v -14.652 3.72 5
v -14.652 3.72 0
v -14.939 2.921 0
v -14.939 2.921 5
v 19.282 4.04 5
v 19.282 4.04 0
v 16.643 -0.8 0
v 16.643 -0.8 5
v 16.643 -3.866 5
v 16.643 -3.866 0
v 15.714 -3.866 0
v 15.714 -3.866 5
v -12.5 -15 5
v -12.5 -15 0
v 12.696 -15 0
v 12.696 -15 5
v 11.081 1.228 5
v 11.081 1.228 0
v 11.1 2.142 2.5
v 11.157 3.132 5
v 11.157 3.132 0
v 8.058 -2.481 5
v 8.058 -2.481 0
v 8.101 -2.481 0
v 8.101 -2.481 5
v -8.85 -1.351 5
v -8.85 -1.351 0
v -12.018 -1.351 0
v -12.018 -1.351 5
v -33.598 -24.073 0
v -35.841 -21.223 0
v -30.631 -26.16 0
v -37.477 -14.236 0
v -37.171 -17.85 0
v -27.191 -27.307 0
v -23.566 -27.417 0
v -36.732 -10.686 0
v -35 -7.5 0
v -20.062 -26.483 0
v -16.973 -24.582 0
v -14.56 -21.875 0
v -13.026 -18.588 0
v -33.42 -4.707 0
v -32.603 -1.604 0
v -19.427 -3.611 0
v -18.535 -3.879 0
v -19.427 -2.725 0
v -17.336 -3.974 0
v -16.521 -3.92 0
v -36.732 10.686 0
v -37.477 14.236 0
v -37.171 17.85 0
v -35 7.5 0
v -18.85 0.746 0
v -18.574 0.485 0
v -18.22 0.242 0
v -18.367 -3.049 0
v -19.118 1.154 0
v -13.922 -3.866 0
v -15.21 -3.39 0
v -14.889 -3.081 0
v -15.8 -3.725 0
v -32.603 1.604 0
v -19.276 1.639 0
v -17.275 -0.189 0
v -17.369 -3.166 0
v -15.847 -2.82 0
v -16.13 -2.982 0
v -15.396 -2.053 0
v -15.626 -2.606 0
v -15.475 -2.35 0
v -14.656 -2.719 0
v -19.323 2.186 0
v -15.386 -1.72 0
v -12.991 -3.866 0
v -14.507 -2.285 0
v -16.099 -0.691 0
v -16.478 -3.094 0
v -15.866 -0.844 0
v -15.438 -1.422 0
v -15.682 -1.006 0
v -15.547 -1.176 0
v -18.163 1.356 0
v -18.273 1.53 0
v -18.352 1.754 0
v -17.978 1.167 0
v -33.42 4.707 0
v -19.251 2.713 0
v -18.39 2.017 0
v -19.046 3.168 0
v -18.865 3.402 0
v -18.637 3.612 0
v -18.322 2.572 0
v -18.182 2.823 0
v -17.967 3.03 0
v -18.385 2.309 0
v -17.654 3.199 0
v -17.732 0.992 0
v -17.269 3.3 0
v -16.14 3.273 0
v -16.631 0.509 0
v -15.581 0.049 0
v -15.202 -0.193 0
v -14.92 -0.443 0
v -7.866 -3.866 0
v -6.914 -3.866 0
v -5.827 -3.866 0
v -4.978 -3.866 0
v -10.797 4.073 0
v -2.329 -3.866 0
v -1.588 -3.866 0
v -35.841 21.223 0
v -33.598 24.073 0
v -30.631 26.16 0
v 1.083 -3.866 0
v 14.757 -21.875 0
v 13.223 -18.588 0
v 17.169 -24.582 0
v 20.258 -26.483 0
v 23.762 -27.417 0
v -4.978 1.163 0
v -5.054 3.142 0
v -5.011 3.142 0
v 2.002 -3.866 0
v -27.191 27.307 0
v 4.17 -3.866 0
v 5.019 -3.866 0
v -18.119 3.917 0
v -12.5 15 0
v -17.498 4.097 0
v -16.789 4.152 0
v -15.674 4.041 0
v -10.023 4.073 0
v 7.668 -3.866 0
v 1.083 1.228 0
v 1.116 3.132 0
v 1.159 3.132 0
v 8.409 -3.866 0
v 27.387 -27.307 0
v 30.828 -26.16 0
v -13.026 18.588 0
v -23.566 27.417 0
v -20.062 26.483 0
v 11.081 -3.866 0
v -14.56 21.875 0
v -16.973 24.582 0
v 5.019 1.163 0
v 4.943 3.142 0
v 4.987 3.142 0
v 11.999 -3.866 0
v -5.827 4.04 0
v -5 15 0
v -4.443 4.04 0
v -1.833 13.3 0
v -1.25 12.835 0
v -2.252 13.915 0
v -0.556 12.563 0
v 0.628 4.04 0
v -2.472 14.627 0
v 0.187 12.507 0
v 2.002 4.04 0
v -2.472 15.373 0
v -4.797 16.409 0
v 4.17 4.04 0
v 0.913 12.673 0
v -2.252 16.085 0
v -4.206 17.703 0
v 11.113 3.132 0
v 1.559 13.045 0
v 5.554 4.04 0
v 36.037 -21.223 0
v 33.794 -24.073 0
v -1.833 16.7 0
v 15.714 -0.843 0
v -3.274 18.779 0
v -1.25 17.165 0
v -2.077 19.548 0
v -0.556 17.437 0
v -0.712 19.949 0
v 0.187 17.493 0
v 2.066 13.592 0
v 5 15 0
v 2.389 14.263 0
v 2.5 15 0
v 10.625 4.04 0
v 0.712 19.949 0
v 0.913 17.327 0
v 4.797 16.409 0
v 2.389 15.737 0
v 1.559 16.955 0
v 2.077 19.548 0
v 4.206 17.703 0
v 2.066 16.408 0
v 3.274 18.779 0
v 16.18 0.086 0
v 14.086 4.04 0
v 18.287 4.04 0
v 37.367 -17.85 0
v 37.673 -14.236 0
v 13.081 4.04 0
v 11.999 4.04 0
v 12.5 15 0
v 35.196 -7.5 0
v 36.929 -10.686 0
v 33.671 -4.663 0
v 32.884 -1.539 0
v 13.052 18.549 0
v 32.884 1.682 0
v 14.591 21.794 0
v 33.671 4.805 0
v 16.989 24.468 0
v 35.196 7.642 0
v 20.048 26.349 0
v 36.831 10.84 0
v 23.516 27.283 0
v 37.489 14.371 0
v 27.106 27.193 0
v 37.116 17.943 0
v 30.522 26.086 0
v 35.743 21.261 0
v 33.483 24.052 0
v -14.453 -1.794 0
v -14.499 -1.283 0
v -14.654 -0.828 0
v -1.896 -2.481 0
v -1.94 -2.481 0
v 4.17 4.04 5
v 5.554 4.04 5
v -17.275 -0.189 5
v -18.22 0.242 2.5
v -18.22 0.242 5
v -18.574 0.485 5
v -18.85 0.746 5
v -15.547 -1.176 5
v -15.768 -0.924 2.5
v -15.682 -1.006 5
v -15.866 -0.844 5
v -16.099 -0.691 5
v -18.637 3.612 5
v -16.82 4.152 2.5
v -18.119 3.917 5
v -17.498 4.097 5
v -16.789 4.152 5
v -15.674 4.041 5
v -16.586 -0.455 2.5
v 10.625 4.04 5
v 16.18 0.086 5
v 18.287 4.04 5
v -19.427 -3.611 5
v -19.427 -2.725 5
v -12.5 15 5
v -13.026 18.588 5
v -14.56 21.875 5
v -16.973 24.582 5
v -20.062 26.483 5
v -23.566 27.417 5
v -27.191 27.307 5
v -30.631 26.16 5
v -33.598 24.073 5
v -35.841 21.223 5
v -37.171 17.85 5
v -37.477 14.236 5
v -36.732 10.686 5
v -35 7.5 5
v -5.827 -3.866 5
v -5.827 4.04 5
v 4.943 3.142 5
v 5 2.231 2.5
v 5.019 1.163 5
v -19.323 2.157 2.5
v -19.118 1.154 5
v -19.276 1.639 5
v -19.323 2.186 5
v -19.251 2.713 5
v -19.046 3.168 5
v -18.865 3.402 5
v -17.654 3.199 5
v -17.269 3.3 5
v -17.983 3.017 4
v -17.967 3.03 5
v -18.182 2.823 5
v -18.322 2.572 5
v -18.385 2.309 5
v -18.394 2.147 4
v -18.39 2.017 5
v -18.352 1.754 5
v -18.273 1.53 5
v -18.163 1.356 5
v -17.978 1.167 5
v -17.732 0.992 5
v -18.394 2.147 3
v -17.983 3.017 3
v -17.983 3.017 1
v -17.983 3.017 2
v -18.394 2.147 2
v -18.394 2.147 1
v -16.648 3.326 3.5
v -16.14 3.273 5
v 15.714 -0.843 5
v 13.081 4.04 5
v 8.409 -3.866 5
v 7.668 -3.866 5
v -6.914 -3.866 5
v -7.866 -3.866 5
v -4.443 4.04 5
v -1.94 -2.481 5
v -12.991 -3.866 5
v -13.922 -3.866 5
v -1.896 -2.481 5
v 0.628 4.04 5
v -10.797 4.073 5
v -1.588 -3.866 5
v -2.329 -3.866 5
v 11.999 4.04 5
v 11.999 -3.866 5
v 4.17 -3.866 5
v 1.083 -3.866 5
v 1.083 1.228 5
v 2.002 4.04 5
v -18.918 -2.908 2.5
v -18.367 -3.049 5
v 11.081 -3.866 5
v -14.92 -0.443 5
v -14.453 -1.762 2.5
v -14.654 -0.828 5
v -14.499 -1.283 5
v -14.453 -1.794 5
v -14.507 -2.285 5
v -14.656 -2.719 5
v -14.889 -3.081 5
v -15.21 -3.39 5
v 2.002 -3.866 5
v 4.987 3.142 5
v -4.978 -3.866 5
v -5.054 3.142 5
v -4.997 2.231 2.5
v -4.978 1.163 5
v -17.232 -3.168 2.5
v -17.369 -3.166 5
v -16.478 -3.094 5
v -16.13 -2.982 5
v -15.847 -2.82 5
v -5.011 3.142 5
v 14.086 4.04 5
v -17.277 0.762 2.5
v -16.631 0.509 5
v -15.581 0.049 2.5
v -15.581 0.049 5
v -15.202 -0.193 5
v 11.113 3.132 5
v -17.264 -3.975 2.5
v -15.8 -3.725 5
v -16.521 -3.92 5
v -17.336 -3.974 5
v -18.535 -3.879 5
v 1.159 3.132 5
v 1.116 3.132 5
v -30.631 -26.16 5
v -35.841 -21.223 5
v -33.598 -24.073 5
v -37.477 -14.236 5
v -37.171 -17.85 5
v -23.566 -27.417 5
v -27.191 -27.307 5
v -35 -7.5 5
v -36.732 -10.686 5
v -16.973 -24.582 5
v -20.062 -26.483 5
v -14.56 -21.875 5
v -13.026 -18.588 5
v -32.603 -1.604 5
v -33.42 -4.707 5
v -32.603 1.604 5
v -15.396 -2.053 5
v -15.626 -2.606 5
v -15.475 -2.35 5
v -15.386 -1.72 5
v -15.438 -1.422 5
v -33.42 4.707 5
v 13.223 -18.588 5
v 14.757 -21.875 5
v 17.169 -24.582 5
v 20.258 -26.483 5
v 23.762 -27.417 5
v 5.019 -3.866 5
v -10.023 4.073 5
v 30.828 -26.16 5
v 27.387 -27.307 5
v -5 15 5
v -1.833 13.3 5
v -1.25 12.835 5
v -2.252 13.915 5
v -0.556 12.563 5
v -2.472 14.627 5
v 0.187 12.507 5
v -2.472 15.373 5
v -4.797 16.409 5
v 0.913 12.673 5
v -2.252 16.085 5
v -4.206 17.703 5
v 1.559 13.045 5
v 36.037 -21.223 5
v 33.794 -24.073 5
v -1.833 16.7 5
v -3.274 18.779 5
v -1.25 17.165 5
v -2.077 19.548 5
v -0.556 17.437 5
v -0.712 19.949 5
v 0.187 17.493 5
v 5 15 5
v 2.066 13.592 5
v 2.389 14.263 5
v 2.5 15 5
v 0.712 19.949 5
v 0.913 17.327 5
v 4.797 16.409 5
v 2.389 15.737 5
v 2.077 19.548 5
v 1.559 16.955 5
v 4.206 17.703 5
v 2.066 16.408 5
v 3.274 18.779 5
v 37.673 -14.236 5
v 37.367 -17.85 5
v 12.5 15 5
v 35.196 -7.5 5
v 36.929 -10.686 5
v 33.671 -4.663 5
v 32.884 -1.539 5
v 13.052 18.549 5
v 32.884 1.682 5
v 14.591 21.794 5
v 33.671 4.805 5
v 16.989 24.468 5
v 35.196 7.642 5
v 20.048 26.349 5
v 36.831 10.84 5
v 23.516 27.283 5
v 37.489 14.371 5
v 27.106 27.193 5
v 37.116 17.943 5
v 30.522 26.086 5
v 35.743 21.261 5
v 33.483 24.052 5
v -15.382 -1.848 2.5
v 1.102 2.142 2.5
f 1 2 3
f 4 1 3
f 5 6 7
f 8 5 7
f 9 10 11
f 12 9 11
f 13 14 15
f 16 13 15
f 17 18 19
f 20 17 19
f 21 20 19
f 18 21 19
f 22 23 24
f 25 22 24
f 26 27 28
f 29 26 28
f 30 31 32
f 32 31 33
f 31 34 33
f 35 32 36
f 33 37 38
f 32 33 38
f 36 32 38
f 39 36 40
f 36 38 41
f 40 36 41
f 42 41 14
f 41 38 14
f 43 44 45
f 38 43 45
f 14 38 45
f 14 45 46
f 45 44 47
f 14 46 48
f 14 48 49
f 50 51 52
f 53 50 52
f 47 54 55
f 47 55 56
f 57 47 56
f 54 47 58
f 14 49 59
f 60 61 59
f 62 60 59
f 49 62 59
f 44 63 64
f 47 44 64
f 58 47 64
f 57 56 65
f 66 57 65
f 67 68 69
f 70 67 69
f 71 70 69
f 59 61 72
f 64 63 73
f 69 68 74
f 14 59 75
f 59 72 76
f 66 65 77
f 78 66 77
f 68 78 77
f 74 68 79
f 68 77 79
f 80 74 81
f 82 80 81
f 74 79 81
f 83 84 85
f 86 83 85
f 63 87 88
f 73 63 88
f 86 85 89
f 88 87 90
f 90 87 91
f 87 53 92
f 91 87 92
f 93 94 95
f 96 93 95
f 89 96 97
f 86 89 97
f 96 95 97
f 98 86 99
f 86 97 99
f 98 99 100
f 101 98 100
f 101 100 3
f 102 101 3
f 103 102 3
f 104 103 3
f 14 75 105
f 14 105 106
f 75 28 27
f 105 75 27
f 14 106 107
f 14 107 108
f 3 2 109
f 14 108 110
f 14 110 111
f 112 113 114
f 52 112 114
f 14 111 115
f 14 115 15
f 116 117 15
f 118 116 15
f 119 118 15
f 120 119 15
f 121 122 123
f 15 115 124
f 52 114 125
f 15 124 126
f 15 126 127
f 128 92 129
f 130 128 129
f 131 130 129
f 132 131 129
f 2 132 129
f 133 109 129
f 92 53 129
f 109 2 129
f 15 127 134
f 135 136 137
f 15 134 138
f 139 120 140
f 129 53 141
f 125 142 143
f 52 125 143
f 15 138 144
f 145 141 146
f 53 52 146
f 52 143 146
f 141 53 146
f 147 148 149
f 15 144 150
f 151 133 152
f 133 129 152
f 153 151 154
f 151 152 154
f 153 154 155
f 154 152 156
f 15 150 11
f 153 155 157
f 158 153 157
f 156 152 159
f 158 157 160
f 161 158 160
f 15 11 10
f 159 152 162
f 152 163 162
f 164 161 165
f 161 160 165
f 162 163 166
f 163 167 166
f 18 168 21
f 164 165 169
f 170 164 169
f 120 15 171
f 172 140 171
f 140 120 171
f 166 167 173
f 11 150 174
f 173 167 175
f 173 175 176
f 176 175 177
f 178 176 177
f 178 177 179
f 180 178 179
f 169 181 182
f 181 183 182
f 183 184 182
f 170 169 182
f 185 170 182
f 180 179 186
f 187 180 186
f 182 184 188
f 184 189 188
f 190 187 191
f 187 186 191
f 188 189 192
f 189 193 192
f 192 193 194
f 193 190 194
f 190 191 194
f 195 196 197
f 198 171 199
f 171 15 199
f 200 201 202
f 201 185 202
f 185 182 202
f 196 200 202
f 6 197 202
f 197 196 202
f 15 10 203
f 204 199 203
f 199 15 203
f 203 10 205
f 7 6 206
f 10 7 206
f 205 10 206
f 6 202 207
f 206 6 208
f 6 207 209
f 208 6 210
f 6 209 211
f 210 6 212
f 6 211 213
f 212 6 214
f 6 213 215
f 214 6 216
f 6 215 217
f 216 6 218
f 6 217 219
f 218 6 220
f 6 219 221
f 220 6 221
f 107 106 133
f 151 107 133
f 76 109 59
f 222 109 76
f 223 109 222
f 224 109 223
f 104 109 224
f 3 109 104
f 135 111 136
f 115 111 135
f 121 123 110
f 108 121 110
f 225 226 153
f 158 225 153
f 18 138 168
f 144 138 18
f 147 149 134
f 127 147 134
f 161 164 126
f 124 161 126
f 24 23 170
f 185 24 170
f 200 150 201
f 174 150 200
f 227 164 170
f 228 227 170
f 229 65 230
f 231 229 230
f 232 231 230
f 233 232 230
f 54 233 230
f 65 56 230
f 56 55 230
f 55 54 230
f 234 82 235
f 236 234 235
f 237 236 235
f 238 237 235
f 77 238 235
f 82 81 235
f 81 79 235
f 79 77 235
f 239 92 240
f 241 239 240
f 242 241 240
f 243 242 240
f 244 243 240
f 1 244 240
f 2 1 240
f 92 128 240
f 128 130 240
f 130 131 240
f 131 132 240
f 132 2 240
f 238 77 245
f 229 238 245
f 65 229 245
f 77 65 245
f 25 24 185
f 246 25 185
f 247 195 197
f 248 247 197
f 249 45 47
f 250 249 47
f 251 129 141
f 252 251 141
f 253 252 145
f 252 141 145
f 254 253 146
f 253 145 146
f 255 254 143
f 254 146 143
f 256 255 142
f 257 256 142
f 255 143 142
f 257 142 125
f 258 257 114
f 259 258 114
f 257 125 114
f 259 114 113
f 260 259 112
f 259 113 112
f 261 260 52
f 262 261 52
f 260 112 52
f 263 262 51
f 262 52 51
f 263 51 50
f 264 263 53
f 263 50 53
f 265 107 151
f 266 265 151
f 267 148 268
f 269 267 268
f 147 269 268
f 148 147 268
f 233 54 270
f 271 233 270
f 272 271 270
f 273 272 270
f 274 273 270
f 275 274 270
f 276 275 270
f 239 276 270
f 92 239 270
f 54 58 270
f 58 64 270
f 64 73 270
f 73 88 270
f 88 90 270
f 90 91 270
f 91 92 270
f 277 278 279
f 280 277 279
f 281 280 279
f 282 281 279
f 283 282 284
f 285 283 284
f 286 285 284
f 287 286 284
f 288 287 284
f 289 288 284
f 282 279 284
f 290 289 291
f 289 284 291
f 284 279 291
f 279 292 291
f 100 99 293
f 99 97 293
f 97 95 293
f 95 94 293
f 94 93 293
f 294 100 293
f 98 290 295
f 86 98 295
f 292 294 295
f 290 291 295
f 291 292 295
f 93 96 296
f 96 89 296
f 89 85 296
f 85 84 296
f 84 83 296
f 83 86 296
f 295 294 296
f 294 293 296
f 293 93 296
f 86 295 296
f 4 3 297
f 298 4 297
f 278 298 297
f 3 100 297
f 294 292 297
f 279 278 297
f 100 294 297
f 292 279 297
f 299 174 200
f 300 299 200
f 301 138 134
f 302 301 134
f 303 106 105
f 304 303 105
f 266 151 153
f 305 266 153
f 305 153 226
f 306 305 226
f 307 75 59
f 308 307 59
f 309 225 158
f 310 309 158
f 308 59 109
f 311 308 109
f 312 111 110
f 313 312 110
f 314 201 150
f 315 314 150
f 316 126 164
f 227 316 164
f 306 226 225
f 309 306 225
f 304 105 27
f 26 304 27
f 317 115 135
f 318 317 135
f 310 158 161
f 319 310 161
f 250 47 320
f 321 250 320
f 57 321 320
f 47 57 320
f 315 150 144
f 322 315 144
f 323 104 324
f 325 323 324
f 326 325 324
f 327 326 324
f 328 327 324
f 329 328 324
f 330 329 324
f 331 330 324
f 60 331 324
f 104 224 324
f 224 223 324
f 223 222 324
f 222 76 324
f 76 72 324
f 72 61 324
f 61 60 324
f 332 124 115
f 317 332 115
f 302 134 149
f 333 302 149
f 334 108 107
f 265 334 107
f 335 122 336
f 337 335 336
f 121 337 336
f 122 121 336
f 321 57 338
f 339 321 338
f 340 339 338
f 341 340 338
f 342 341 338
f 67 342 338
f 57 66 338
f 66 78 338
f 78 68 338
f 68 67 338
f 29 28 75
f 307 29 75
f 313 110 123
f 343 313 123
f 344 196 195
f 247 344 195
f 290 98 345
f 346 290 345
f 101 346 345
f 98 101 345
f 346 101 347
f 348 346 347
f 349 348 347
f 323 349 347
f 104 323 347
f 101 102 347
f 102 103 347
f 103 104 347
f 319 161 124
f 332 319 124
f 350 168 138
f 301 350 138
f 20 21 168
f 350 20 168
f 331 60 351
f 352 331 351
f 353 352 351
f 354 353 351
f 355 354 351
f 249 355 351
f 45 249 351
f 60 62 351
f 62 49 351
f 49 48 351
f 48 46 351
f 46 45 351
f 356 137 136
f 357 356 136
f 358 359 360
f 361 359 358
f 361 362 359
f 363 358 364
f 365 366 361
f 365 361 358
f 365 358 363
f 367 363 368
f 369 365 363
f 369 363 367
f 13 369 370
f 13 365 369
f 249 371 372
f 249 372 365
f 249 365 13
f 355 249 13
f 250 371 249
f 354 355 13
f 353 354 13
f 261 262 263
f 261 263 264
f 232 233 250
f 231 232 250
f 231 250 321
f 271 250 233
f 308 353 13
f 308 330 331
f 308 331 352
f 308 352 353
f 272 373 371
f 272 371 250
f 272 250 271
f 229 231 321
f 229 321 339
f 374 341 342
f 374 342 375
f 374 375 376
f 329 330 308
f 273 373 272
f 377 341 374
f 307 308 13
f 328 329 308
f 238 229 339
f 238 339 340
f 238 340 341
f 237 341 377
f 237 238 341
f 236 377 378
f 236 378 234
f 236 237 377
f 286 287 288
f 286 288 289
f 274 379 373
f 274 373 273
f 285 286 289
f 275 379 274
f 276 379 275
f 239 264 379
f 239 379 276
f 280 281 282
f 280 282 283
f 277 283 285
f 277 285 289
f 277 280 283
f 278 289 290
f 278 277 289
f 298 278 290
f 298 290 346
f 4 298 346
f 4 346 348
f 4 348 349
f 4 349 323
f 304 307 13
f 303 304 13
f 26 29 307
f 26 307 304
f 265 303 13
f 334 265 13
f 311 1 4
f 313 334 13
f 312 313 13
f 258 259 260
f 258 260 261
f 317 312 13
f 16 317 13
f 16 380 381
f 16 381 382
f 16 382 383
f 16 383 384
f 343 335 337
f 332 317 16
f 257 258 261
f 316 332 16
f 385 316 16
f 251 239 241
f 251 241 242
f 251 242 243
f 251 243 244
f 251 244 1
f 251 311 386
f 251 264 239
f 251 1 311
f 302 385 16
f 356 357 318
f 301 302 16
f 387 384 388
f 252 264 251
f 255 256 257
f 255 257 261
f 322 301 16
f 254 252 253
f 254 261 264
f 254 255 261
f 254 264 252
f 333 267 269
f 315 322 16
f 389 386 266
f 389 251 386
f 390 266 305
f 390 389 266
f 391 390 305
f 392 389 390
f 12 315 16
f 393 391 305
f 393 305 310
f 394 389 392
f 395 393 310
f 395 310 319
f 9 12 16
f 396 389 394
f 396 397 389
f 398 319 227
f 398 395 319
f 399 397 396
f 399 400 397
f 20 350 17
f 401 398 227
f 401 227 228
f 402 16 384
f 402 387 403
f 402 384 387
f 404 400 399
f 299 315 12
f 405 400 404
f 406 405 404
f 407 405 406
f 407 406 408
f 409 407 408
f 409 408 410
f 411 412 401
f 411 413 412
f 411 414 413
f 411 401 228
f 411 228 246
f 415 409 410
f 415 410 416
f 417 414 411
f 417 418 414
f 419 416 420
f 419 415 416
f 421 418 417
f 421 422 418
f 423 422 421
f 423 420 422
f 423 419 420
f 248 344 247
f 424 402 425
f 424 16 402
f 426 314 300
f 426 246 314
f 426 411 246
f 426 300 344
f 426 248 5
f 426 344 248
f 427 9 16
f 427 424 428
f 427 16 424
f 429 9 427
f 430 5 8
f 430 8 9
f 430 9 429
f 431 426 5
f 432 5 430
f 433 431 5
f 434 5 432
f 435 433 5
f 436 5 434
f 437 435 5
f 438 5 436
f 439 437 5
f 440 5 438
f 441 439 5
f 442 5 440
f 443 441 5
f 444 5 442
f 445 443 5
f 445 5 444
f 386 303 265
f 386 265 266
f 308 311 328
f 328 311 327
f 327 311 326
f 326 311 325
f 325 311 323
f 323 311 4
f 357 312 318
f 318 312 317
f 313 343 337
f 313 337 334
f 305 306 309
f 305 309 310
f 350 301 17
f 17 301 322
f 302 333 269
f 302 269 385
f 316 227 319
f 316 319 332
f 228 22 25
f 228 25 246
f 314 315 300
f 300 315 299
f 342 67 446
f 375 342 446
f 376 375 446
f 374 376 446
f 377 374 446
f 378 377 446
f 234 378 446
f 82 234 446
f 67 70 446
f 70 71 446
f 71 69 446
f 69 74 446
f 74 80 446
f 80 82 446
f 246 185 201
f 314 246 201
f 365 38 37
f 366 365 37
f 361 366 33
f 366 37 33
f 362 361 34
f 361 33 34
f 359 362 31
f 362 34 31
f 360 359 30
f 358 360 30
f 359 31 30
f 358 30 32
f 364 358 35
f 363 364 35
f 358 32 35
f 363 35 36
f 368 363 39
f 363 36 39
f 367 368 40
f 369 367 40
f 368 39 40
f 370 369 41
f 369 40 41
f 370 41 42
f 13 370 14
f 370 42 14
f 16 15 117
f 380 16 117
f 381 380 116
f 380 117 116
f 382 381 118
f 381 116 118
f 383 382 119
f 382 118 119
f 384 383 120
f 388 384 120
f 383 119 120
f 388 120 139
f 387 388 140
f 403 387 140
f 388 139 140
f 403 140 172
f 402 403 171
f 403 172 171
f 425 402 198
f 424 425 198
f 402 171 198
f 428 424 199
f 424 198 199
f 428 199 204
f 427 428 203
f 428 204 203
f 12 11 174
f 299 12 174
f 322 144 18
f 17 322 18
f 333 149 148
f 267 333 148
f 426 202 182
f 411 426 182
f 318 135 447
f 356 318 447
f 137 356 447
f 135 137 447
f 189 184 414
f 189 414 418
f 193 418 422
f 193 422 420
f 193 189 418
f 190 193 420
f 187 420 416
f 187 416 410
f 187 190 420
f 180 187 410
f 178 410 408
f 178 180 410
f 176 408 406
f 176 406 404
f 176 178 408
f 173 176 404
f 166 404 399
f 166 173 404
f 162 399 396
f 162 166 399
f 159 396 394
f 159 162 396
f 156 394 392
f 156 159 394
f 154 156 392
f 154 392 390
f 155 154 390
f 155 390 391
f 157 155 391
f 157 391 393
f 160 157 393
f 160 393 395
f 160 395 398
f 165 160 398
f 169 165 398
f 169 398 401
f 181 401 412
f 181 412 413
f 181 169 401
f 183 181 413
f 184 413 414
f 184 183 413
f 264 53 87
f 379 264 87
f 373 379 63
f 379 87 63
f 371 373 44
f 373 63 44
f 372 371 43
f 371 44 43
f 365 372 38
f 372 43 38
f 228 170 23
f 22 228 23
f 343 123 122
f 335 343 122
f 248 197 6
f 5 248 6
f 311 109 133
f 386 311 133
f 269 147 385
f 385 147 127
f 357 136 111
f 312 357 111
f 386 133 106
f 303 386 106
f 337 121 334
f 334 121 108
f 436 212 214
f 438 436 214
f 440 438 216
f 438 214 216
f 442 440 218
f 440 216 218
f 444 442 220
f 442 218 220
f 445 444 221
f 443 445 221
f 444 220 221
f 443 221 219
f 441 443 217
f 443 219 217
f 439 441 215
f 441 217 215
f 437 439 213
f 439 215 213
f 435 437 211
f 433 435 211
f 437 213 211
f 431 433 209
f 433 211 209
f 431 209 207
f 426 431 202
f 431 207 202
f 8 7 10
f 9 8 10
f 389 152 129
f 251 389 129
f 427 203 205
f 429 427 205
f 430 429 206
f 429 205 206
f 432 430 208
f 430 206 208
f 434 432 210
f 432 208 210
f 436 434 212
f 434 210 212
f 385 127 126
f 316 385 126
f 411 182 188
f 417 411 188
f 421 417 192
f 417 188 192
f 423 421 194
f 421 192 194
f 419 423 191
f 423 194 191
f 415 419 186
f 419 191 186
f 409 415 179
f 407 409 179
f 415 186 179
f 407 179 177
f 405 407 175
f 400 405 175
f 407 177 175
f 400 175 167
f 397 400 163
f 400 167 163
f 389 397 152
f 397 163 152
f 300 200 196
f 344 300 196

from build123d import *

# Parameters (mm, degrees)
F0_R     = 2.5
F1_DEPTH = 5


with BuildPart() as f1:
    # F0 (on Top) → F1 (new body)
    with BuildSketch(Plane.XY):
        with BuildLine():
            Line((-5, 15), (-12.5, 15))
            ThreePointArc((-12.5, 15), (-28.9528470752, 26.8585412256), (-35, 7.5))
            ThreePointArc((-35, 7.5), (-32.5, 0), (-35, -7.5))
            ThreePointArc((-35, -7.5), (-28.9528470752, -26.8585412256), (-12.5, -15))
            Line((-12.5, -15), (12.6964542654, -15))
            ThreePointArc((12.6964542654, -15), (29.1493013406, -26.8585412256), (35.1964542654, -7.5))
            ThreePointArc((35.1964542654, -7.5), (32.784838444, 0.0710641767), (35.1964542654, 7.6421283534))
            ThreePointArc((35.1964542654, 7.6421283534), (28.8541630659, 26.7626213853), (12.5, 15))
            Line((12.5, 15), (5, 15))
            ThreePointArc((5, 15), (0, 20), (-5, 15))
        make_face()
        with BuildLine():
            add(Edge.make_bspline(
                [(-14.9199757765, -0.4431015054), (-14.4528073363, -0.9517960291), (-14.4528073363, -1.7615546588)],
                knots=[0, 0, 0, 1, 1, 1], degree=2))
            add(Edge.make_bspline(
                [(-14.4528073363, -1.7615546588), (-14.4528073363, -2.8048975085), (-15.2097932347, -3.3897231855)],
                knots=[0, 0, 0, 1, 1, 1], degree=2))
            add(Edge.make_bspline(
                [(-15.2097932347, -3.3897231855), (-15.9667791331, -3.9745488624), (-17.2644692447, -3.9745488624)],
                knots=[0, 0, 0, 1, 1, 1], degree=2))
            add(Edge.make_bspline(
                [(-17.2644692447, -3.9745488624), (-18.6694350722, -3.9745488624), (-19.4272860974, -3.6111956312)],
                knots=[0, 0, 0, 1, 1, 1], degree=2))
            Line((-19.4272860974, -3.6111956312), (-19.4272860974, -2.7253058483))
            add(Edge.make_bspline(
                [(-19.4272860974, -2.7253058483), (-18.9393546155, -2.9294757592), (-18.3666407129, -3.0488632495)],
                knots=[0, 0, 0, 1, 1, 1], degree=2))
            add(Edge.make_bspline(
                [(-18.3666407129, -3.0488632495), (-17.7939268103, -3.1682507397), (-17.2315944286, -3.1682507397)],
                knots=[0, 0, 0, 1, 1, 1], degree=2))
            add(Edge.make_bspline(
                [(-17.2315944286, -3.1682507397), (-16.3128298296, -3.1682507397), (-15.8473916429, -2.8196046631)],
                knots=[0, 0, 0, 1, 1, 1], degree=2))
            add(Edge.make_bspline(
                [(-15.8473916429, -2.8196046631), (-15.3819534562, -2.4709585864), (-15.3819534562, -1.8480673329)],
                knots=[0, 0, 0, 1, 1, 1], degree=2))
            add(Edge.make_bspline(
                [(-15.3819534562, -1.8480673329), (-15.3819534562, -1.4379972576), (-15.5471926637, -1.1758638551)],
                knots=[0, 0, 0, 1, 1, 1], degree=2))
            add(Edge.make_bspline(
                [(-15.5471926637, -1.1758638551), (-15.7124318713, -0.9137304525), (-16.0991435245, -0.6913928801)],
                knots=[0, 0, 0, 1, 1, 1], degree=2))
            add(Edge.make_bspline(
                [(-16.0991435245, -0.6913928801), (-16.4858551778, -0.4690553076), (-17.2748507656, -0.1887542435)],
                knots=[0, 0, 0, 1, 1, 1], degree=2))
            add(Edge.make_bspline(
                [(-17.2748507656, -0.1887542435), (-18.3770222338, 0.2057435504), (-18.8502465611, 0.7464477636)],
                knots=[0, 0, 0, 1, 1, 1], degree=2))
            add(Edge.make_bspline(
                [(-18.8502465611, 0.7464477636), (-19.3234708885, 1.2871519767), (-19.3234708885, 2.1574694783)],
                knots=[0, 0, 0, 1, 1, 1], degree=2))
            add(Edge.make_bspline(
                [(-19.3234708885, 2.1574694783), (-19.3234708885, 3.0710433168), (-18.6374253828, 3.61174753)],
                knots=[0, 0, 0, 1, 1, 1], degree=2))
            add(Edge.make_bspline(
                [(-18.6374253828, 3.61174753), (-17.9513798772, 4.1524517432), (-16.8197940998, 4.1524517432)],
                knots=[0, 0, 0, 1, 1, 1], degree=2))
            add(Edge.make_bspline(
                [(-16.8197940998, 4.1524517432), (-15.6414914785, 4.1524517432), (-14.6517864867, 3.7198883726)],
                knots=[0, 0, 0, 1, 1, 1], degree=2))
            Line((-14.6517864867, 3.7198883726), (-14.9390085648, 2.9205112639))
            add(Edge.make_bspline(
                [(-14.9390085648, 2.9205112639), (-15.9183320356, 3.3305813392), (-16.8422873951, 3.3305813392)],
                knots=[0, 0, 0, 1, 1, 1], degree=2))
            add(Edge.make_bspline(
                [(-16.8422873951, 3.3305813392), (-17.5724543646, 3.3305813392), (-17.9833895666, 3.0174054589)],
                knots=[0, 0, 0, 1, 1, 1], degree=2))
            add(Edge.make_bspline(
                [(-17.9833895666, 3.0174054589), (-18.3943247686, 2.7042295786), (-18.3943247686, 2.1470879574)],
                knots=[0, 0, 0, 1, 1, 1], degree=2))
            add(Edge.make_bspline(
                [(-18.3943247686, 2.1470879574), (-18.3943247686, 1.7370178821), (-18.2429275889, 1.4740193528)],
                knots=[0, 0, 0, 1, 1, 1], degree=2))
            add(Edge.make_bspline(
                [(-18.2429275889, 1.4740193528), (-18.0915304092, 1.2110208235), (-17.7316376849, 0.992143758)],
                knots=[0, 0, 0, 1, 1, 1], degree=2))
            add(Edge.make_bspline(
                [(-17.7316376849, 0.992143758), (-17.3717449606, 0.7732666926), (-16.6311964703, 0.5085379098)],
                knots=[0, 0, 0, 1, 1, 1], degree=2))
            add(Edge.make_bspline(
                [(-16.6311964703, 0.5085379098), (-15.3871442166, 0.0655930184), (-14.9199757765, -0.4431015054)],
                knots=[0, 0, 0, 1, 1, 1], degree=2))
        make_face(mode=Mode.SUBTRACT)
        Polygon((-6.9140929146, -3.865542893), (-7.8657323298, -3.865542893), (-8.8502465611, -1.3514845835), (-12.0183406869, -1.3514845835), (-12.9907431439, -3.865542893), (-13.9216195173, -3.865542893), (-10.7967817285, 4.072860083), (-10.023358422, 4.072860083), align=None, mode=Mode.SUBTRACT)
        with BuildLine():
            Line((-1.5883726966, -3.865542893), (-2.328921187, -3.865542893))
            Line((-2.328921187, -3.865542893), (-5.0108140843, 3.1419837096))
            Line((-5.0108140843, 3.1419837096), (-5.0540704213, 3.1419837096))
            add(Edge.make_bspline(
                [(-5.0540704213, 3.1419837096), (-4.9779392681, 2.3097317847), (-4.9779392681, 1.162573726)],
                knots=[0, 0, 0, 1, 1, 1], degree=2))
            Line((-4.9779392681, 1.162573726), (-4.9779392681, -3.865542893))
            Line((-4.9779392681, -3.865542893), (-5.8274937278, -3.865542893))
            Line((-5.8274937278, -3.865542893), (-5.8274937278, 4.0399852668))
            Line((-5.8274937278, 4.0399852668), (-4.4432909421, 4.0399852668))
            Line((-4.4432909421, 4.0399852668), (-1.9396141535, -2.4813401073))
            Line((-1.9396141535, -2.4813401073), (-1.8963578164, -2.4813401073))
            Line((-1.8963578164, -2.4813401073), (0.628082014, 4.0399852668))
            Line((0.628082014, 4.0399852668), (2.0019032788, 4.0399852668))
            Line((2.0019032788, 4.0399852668), (2.0019032788, -3.865542893))
            Line((2.0019032788, -3.865542893), (1.0831386798, -3.865542893))
            Line((1.0831386798, -3.865542893), (1.0831386798, 1.2283233584))
            add(Edge.make_bspline(
                [(1.0831386798, 1.2283233584), (1.0831386798, 2.1038316203), (1.159269833, 3.1316021887)],
                knots=[0, 0, 0, 1, 1, 1], degree=2))
            Line((1.159269833, 3.1316021887), (1.116013496, 3.1316021887))
            Line((1.116013496, 3.1316021887), (-1.5883726966, -3.865542893))
        make_face(mode=Mode.SUBTRACT)
        with Locations((0, 15)):
            Circle(F0_R, mode=Mode.SUBTRACT)
        with BuildLine():
            Line((8.4090319232, -3.865542893), (7.6684834328, -3.865542893))
            Line((7.6684834328, -3.865542893), (4.9865905355, 3.1419837096))
            Line((4.9865905355, 3.1419837096), (4.9433341985, 3.1419837096))
            add(Edge.make_bspline(
                [(4.9433341985, 3.1419837096), (5.0194653517, 2.3097317847), (5.0194653517, 1.162573726)],
                knots=[0, 0, 0, 1, 1, 1], degree=2))
            Line((5.0194653517, 1.162573726), (5.0194653517, -3.865542893))
            Line((5.0194653517, -3.865542893), (4.1699108919, -3.865542893))
            Line((4.1699108919, -3.865542893), (4.1699108919, 4.0399852668))
            Line((4.1699108919, 4.0399852668), (5.5541136777, 4.0399852668))
            Line((5.5541136777, 4.0399852668), (8.0577904663, -2.4813401073))
            Line((8.0577904663, -2.4813401073), (8.1010468034, -2.4813401073))
            Line((8.1010468034, -2.4813401073), (10.6254866338, 4.0399852668))
            Line((10.6254866338, 4.0399852668), (11.9993078986, 4.0399852668))
            Line((11.9993078986, 4.0399852668), (11.9993078986, -3.865542893))
            Line((11.9993078986, -3.865542893), (11.0805432996, -3.865542893))
            Line((11.0805432996, -3.865542893), (11.0805432996, 1.2283233584))
            add(Edge.make_bspline(
                [(11.0805432996, 1.2283233584), (11.0805432996, 2.1038316203), (11.1566744528, 3.1316021887)],
                knots=[0, 0, 0, 1, 1, 1], degree=2))
            Line((11.1566744528, 3.1316021887), (11.1134181158, 3.1316021887))
            Line((11.1134181158, 3.1316021887), (8.4090319232, -3.865542893))
        make_face(mode=Mode.SUBTRACT)
        Polygon((14.0859935981, 4.0399852668), (16.1796003114, 0.0863560601), (18.2870490527, 4.0399852668), (19.2819448049, 4.0399852668), (16.6433082447, -0.7995337227), (16.6433082447, -3.865542893), (15.7141621248, -3.865542893), (15.7141621248, -0.8427900598), (13.0807163249, 4.0399852668), align=None, mode=Mode.SUBTRACT)
    extrude(amount=F1_DEPTH)


solid = f1.part
